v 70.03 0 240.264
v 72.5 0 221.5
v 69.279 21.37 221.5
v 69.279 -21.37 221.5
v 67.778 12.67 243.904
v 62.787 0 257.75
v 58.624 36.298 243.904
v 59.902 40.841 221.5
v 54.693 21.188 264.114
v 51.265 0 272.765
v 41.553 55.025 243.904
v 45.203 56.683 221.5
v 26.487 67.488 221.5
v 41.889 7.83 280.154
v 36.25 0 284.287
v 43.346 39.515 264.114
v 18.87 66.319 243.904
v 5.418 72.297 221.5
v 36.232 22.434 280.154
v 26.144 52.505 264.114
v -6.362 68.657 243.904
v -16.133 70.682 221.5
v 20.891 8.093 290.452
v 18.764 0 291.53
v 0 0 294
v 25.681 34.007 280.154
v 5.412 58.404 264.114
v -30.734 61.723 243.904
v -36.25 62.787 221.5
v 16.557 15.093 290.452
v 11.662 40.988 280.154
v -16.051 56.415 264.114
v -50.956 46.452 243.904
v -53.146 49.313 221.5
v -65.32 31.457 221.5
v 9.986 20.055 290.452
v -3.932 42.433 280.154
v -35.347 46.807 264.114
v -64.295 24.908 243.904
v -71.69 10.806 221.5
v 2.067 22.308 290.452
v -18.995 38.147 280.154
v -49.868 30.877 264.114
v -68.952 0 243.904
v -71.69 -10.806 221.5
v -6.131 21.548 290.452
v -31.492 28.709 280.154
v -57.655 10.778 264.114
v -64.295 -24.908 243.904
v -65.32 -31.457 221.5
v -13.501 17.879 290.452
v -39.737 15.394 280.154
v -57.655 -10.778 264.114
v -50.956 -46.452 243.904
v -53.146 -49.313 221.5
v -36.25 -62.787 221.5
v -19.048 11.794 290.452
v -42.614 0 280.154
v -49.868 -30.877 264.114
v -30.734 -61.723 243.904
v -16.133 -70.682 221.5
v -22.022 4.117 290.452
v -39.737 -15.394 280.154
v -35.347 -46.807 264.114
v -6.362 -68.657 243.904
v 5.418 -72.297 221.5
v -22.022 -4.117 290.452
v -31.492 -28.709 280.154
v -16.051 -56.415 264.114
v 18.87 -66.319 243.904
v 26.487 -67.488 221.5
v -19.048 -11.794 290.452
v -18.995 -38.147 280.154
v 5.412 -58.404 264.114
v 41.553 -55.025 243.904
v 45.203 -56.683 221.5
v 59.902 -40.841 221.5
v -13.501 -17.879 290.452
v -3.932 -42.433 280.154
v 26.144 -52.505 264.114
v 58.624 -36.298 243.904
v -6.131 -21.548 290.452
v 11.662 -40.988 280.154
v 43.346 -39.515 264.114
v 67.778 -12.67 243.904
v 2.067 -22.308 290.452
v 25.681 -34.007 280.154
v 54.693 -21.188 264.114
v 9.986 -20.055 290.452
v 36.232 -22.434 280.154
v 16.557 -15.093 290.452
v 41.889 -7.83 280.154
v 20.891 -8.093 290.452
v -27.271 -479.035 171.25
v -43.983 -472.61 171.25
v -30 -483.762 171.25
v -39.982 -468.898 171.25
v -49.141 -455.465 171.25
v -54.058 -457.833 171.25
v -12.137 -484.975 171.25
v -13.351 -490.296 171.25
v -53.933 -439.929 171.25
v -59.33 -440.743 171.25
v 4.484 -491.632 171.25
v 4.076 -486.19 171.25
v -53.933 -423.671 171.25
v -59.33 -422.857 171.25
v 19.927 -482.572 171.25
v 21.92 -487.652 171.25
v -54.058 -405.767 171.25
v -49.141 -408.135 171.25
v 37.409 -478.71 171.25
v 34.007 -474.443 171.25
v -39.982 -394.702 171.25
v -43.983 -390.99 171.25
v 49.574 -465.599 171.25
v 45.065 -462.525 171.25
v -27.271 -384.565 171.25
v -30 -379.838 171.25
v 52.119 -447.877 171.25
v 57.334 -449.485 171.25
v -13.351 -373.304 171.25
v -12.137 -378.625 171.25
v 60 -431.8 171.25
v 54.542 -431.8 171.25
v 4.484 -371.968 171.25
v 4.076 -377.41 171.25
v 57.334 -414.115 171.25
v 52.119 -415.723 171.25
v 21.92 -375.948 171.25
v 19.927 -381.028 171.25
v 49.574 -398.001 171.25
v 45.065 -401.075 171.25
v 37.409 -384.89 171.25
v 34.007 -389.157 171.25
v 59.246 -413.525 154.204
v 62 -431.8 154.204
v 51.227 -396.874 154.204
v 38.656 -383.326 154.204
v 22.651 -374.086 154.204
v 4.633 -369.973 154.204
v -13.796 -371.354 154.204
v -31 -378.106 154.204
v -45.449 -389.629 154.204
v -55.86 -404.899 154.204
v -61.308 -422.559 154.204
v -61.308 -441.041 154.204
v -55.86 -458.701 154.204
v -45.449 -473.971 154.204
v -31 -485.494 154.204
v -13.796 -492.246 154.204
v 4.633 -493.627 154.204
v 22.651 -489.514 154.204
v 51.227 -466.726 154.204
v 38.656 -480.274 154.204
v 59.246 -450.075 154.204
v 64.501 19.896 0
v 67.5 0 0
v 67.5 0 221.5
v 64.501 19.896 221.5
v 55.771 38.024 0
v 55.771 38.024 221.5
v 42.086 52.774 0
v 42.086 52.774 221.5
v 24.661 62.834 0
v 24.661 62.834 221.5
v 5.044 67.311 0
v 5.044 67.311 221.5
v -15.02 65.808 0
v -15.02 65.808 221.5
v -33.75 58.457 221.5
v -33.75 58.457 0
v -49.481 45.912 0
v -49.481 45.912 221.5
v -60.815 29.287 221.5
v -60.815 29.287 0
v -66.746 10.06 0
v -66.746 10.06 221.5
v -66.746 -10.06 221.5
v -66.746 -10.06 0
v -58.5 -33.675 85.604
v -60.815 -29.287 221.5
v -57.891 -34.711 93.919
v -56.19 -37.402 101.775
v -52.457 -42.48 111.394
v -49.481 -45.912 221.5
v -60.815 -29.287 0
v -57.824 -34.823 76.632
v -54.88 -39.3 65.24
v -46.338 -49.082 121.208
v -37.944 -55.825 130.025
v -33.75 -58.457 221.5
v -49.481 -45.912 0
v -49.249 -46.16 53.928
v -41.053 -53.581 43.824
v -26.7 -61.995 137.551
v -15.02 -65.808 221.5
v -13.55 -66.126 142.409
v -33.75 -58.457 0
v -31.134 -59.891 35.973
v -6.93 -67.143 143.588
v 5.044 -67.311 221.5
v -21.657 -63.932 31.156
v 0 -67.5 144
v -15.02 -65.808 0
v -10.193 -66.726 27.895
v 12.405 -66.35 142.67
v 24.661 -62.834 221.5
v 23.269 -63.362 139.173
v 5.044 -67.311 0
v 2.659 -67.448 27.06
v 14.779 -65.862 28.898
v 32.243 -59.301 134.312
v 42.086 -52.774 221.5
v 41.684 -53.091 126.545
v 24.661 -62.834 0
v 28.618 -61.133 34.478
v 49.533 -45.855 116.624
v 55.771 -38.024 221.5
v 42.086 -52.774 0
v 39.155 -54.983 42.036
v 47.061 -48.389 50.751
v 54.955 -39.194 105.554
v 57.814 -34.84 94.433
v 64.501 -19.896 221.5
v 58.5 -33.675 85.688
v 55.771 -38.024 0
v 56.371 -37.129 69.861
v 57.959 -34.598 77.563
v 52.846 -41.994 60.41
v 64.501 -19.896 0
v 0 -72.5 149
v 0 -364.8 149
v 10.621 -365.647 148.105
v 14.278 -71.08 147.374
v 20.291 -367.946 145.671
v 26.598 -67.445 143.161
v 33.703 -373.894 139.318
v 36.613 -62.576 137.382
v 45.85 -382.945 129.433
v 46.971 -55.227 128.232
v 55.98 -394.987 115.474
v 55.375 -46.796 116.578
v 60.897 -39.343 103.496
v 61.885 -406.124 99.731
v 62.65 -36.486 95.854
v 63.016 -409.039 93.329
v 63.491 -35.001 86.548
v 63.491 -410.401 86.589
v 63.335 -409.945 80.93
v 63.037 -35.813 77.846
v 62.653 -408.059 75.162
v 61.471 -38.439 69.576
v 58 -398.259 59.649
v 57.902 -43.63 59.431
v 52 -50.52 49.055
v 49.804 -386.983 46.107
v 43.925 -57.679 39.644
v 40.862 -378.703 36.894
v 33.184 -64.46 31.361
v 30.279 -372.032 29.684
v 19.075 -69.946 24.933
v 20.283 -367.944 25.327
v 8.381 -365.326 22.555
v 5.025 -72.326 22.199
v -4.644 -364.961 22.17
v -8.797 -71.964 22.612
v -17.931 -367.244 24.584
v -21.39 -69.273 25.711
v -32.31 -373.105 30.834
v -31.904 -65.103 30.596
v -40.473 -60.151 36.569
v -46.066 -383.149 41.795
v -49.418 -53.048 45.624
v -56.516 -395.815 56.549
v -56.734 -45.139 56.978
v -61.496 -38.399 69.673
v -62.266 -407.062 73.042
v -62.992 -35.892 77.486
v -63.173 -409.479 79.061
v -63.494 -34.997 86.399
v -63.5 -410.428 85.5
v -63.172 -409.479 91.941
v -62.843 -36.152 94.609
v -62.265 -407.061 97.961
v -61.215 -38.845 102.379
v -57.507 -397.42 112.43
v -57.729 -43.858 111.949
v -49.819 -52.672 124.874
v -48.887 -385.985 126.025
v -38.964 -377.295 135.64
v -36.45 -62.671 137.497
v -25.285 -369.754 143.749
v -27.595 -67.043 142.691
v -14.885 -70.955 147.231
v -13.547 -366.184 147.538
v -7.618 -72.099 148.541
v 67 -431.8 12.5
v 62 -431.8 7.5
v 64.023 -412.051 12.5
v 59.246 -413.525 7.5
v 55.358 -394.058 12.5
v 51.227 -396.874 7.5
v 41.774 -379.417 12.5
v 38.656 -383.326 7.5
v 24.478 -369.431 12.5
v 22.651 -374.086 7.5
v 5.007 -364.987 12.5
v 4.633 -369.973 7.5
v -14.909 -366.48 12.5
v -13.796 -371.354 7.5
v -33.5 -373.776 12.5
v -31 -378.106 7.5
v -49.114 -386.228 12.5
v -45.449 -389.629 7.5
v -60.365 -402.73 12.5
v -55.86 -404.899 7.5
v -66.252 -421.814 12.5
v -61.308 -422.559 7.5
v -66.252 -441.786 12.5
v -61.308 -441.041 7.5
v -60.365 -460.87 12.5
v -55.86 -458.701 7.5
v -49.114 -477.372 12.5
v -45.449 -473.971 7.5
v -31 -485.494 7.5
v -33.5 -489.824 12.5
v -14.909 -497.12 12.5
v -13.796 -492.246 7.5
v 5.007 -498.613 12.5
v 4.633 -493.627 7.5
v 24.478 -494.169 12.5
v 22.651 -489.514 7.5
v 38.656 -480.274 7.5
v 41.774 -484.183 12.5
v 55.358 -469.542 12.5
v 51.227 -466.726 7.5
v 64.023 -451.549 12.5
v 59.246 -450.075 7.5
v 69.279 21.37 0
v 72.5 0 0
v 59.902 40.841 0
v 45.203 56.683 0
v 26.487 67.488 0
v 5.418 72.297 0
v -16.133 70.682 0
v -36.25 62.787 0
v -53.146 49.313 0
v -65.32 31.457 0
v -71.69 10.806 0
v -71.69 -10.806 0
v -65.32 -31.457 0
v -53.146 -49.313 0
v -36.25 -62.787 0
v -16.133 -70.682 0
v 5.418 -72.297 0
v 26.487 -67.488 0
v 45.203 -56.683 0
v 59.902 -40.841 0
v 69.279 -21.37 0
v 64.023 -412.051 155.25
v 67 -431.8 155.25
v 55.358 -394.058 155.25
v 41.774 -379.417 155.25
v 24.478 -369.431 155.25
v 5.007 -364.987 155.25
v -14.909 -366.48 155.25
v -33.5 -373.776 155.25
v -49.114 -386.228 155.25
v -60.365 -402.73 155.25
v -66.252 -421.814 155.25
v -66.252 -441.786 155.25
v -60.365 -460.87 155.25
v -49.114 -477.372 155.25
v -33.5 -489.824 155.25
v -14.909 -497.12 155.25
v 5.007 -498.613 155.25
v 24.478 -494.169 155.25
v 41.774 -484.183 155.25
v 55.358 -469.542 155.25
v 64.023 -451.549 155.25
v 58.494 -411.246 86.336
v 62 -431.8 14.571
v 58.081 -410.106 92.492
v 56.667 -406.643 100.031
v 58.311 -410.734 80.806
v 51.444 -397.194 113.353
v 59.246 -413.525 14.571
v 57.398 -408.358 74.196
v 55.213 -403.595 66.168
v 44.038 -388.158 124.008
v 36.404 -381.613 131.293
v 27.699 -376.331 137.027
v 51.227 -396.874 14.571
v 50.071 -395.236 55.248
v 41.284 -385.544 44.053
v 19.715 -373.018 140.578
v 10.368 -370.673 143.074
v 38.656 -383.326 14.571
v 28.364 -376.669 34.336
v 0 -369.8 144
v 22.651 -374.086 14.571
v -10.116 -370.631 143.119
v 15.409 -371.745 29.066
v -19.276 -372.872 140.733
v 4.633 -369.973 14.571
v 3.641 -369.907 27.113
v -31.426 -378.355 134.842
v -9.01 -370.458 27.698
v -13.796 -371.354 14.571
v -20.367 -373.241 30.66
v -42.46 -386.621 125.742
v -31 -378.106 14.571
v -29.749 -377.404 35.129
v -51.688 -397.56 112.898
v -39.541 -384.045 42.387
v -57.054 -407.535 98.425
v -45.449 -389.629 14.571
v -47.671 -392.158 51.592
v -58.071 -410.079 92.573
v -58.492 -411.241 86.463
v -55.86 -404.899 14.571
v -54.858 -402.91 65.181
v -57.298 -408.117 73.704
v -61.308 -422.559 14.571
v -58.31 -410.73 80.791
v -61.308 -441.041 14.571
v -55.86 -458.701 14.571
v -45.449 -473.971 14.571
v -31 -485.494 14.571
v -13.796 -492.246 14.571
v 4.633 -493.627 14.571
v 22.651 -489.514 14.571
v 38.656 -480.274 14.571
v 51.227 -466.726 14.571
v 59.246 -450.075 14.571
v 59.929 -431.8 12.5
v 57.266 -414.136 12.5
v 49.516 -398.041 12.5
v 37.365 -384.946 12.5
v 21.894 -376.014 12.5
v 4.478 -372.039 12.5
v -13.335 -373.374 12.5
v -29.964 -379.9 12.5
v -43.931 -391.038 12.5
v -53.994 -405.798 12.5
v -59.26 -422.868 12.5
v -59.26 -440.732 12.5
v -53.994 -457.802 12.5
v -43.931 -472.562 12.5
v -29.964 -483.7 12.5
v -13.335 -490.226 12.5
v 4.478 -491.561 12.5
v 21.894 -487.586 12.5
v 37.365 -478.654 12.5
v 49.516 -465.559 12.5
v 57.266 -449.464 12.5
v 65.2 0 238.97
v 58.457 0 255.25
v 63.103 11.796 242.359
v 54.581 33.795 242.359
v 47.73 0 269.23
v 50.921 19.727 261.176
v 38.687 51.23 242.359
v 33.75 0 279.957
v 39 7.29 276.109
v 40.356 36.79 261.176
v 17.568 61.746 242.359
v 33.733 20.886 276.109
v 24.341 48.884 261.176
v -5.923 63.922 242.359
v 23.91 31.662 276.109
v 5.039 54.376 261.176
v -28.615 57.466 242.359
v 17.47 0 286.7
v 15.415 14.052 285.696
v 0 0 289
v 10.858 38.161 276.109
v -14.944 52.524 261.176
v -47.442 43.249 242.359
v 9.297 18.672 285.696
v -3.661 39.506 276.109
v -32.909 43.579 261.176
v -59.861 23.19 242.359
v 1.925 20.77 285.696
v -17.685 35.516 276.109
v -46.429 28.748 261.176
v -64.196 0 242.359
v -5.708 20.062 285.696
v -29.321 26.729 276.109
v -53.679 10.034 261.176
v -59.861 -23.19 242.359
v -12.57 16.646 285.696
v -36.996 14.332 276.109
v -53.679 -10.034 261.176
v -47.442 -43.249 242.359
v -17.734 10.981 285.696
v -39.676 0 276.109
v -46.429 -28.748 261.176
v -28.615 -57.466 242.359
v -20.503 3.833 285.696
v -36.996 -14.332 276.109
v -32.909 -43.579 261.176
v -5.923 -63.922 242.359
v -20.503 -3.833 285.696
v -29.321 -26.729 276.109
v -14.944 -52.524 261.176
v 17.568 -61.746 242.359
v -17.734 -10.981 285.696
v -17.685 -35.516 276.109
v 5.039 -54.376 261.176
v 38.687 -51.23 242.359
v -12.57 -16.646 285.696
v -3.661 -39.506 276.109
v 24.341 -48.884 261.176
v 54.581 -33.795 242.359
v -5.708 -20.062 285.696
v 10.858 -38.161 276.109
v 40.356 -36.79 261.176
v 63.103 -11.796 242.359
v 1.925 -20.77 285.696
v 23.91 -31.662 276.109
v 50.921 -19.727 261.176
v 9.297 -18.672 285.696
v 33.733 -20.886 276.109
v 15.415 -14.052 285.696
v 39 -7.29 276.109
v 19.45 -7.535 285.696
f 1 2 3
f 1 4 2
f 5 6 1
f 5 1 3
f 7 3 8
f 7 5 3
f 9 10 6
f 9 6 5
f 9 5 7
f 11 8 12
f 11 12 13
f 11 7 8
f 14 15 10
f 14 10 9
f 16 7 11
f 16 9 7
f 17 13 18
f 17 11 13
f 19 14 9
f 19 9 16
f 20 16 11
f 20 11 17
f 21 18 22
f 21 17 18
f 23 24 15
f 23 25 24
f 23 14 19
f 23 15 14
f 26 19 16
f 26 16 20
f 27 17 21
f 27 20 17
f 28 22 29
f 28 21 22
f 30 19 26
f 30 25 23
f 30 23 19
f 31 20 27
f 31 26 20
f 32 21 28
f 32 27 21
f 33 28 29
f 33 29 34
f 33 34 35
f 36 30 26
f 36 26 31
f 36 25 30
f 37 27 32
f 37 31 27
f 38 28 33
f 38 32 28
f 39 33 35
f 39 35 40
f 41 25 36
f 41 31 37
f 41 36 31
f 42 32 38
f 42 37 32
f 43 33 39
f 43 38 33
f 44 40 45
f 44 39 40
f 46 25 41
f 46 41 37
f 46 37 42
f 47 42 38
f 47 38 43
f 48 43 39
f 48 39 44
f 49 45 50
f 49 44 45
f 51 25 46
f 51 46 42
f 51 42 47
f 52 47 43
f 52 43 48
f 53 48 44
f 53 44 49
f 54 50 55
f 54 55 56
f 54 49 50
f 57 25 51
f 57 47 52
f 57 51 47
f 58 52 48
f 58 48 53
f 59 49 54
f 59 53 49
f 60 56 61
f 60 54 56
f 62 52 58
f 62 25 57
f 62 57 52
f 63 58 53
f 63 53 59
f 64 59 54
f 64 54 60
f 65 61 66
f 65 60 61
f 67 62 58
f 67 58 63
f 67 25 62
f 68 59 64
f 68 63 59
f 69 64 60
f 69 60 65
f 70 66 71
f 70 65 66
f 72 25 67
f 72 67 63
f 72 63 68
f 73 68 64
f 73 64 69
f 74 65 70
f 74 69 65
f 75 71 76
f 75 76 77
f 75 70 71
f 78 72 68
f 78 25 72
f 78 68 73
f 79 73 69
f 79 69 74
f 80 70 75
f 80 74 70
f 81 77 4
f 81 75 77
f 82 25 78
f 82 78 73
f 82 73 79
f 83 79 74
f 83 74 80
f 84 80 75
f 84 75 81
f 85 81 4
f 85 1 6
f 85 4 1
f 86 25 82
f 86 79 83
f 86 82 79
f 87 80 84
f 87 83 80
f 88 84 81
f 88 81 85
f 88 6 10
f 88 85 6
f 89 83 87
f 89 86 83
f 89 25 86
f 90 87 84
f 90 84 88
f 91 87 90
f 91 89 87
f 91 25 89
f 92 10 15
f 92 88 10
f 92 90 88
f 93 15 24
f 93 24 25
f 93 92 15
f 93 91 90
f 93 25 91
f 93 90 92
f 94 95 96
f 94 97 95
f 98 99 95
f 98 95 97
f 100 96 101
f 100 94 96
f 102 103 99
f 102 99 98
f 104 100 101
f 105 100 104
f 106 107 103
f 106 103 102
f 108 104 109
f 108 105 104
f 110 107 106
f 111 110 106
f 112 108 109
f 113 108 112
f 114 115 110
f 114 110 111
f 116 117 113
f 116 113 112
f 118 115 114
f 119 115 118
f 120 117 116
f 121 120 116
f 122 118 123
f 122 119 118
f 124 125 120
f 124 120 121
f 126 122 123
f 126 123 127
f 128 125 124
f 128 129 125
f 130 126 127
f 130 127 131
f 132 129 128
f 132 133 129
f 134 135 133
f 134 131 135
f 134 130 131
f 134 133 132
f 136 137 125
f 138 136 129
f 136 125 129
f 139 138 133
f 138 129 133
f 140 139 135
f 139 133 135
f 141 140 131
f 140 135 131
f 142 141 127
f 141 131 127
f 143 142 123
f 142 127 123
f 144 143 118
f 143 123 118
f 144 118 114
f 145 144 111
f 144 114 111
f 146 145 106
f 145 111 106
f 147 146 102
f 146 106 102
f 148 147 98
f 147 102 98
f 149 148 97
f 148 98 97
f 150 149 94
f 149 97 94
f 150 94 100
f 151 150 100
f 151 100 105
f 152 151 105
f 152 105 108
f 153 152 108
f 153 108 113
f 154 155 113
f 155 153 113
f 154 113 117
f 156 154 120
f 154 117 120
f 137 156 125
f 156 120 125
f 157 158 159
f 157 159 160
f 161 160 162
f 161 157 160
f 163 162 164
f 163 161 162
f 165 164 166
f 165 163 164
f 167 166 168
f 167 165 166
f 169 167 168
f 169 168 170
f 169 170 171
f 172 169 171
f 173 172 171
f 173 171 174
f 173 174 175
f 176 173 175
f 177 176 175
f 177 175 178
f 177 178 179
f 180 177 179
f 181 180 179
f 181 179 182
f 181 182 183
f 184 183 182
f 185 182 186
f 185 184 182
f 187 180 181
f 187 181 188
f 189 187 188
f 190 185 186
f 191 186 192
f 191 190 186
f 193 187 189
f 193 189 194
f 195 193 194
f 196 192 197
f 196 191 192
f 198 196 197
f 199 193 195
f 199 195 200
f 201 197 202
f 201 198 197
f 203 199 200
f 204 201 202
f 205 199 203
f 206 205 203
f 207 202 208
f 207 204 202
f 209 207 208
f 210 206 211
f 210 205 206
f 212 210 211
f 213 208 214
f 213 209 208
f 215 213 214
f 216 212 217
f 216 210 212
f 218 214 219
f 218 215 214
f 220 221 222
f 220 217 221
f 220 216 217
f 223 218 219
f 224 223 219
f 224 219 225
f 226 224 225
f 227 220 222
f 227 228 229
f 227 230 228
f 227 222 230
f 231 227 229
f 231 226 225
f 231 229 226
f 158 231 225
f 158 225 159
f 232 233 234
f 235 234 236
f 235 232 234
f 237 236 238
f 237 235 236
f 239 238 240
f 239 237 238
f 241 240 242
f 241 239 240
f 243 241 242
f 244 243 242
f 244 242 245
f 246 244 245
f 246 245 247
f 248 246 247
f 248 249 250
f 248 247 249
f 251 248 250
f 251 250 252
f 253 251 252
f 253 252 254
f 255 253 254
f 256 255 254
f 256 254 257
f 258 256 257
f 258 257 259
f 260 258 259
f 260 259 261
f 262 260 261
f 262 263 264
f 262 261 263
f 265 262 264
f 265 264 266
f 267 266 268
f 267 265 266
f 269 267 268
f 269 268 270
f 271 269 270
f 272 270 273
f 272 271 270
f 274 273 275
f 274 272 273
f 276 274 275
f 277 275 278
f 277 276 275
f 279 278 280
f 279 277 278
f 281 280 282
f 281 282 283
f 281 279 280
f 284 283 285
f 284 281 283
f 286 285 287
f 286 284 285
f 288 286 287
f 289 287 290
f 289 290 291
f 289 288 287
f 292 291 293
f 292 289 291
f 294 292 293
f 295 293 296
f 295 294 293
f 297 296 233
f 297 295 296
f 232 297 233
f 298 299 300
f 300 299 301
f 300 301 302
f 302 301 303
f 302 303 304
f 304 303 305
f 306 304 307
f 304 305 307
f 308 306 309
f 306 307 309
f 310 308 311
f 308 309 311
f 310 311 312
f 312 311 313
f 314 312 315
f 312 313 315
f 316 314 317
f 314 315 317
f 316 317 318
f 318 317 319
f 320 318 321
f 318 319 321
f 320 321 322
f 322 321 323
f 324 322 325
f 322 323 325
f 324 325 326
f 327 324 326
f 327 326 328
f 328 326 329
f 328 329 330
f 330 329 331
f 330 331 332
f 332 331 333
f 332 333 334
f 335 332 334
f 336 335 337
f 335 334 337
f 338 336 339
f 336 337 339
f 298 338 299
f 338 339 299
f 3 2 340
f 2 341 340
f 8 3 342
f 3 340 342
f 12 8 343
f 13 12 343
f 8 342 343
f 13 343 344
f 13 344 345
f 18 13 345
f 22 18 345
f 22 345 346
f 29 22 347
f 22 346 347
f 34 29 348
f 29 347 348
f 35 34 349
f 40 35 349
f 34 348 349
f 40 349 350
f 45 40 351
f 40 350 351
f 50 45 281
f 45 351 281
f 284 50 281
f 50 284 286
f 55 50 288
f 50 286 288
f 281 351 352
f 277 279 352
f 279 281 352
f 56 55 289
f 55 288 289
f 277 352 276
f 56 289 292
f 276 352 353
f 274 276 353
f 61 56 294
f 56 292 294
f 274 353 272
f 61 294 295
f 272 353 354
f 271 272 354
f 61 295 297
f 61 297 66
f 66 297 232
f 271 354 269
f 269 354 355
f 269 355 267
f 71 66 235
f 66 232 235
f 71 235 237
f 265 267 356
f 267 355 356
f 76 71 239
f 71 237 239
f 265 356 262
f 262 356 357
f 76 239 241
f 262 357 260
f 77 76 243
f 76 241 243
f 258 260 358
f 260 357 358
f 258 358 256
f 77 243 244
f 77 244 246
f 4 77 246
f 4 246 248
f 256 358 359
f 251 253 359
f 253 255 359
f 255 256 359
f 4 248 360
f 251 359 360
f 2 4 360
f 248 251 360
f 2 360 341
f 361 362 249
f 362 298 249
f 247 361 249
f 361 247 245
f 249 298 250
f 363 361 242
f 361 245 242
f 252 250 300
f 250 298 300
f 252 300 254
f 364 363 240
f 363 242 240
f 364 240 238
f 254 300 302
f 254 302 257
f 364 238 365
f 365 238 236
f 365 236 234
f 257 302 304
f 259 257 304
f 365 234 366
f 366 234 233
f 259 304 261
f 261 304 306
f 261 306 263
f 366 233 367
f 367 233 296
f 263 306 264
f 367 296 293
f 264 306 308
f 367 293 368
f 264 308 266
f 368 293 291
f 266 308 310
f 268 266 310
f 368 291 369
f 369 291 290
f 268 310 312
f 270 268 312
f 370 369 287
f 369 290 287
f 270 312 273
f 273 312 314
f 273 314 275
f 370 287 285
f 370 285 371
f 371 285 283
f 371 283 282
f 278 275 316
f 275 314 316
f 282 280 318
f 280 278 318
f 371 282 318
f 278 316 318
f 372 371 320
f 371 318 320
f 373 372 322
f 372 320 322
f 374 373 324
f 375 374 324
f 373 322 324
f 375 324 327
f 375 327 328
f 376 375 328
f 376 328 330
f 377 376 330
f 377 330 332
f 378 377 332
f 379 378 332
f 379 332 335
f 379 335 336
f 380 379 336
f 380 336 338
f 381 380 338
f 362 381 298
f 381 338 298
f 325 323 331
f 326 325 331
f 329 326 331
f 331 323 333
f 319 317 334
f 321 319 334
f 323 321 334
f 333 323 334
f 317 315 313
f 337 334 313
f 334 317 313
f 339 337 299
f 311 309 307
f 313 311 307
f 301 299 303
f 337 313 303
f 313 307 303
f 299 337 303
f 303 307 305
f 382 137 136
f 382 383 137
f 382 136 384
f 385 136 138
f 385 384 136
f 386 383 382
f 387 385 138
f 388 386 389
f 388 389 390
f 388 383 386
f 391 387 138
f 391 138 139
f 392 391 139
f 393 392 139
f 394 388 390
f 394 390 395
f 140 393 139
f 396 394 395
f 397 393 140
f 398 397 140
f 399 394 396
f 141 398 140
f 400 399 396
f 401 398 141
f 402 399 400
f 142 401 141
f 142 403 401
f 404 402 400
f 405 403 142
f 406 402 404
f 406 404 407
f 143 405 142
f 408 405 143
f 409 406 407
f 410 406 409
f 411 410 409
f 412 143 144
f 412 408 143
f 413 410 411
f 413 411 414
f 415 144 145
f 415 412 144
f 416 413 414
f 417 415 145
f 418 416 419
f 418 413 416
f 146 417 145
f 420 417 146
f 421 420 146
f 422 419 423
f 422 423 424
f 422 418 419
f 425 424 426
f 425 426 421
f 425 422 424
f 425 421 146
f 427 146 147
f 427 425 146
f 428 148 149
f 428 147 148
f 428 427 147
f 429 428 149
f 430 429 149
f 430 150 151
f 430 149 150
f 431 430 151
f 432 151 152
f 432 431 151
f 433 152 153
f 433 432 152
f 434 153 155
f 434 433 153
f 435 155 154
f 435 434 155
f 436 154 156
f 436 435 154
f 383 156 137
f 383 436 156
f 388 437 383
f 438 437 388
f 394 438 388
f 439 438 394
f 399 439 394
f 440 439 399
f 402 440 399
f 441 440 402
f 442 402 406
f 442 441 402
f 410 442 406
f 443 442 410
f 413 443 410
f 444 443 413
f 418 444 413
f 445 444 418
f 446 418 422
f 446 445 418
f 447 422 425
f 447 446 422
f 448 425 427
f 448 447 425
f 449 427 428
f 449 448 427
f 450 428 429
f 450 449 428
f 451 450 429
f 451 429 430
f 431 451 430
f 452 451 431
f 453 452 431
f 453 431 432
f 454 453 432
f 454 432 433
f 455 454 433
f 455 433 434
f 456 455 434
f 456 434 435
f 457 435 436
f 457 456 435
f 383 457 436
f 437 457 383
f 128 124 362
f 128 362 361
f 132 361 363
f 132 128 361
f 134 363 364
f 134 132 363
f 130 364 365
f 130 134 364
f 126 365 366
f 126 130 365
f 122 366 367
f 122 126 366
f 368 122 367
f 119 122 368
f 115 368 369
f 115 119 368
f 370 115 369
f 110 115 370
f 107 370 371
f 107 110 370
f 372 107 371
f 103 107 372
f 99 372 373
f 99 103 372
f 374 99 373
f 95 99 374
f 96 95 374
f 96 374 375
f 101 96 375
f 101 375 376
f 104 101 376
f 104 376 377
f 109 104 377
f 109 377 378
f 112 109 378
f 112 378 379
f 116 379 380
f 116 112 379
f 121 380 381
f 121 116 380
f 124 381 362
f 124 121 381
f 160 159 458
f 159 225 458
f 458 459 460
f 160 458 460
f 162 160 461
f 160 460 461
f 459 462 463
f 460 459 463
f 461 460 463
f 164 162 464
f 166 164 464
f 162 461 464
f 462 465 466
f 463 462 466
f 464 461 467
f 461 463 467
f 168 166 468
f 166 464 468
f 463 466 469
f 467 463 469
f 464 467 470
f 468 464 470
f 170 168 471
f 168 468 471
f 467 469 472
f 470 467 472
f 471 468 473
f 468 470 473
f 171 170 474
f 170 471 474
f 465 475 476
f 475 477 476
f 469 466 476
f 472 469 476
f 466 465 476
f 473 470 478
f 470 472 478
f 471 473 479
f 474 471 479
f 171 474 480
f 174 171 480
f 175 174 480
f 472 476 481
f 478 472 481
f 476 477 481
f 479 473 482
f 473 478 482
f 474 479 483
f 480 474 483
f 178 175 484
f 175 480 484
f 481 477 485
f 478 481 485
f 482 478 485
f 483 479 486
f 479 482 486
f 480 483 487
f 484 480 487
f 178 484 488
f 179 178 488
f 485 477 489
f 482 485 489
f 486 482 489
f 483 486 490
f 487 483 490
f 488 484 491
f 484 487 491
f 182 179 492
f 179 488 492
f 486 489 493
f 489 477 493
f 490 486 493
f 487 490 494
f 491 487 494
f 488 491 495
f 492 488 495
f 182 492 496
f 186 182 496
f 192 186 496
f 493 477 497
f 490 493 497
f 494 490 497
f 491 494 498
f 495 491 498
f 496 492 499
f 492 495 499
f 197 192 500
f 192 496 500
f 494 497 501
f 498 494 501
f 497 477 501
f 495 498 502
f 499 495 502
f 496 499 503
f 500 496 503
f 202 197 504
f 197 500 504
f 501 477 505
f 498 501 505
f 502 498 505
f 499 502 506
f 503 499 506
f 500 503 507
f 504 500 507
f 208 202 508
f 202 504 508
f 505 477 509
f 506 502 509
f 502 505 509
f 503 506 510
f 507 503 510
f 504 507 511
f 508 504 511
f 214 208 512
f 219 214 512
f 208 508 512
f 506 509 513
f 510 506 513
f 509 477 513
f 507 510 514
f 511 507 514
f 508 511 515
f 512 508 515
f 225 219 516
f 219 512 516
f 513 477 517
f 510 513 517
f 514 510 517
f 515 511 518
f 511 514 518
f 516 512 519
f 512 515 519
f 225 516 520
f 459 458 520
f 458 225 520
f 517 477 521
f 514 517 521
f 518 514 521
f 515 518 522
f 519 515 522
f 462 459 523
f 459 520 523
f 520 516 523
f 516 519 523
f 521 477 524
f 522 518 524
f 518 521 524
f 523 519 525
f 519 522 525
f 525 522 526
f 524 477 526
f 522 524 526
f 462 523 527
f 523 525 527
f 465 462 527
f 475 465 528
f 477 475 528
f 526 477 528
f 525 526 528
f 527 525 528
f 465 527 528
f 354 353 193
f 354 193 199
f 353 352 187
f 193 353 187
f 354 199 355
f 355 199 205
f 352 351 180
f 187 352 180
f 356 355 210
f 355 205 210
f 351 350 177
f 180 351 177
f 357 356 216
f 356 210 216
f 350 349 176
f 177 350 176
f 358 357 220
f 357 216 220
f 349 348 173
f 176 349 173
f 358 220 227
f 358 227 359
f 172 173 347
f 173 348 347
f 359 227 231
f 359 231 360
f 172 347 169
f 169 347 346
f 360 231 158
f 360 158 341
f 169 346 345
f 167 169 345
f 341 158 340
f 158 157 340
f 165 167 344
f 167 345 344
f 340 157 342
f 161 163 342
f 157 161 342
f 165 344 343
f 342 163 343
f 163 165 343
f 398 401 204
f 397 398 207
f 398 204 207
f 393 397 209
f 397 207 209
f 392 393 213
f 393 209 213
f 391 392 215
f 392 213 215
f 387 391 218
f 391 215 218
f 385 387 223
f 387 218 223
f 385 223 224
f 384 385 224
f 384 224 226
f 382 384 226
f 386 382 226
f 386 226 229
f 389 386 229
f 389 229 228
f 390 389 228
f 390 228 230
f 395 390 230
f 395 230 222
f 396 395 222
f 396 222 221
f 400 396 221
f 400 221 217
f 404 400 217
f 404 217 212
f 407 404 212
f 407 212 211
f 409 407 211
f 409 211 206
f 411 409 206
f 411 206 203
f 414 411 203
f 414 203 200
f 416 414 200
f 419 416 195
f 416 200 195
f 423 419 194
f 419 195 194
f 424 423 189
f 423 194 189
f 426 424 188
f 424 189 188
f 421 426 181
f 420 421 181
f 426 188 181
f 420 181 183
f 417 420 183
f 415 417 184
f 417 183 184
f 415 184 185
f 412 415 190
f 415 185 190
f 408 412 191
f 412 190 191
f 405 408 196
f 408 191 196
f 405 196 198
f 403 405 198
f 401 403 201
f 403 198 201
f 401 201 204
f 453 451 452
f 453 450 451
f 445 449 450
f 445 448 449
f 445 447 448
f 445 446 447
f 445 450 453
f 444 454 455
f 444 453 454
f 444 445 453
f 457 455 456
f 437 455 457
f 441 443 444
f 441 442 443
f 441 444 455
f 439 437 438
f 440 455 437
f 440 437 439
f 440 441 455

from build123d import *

# Parameters (mm, degrees)
SKETCH1_R                = 72.5
BOSS_EXTRUDE1_DEPTH      = 294
FILLET1_R                = 72.5
SKETCH2_R                = 63.5
BOSS_EXTRUDE2_DEPTH      = 431.8
BOSS_EXTRUDE3_DEPTH      = 85.75
BOSS_EXTRUDE3_DEPTH_BACK = 78
SKETCH3_R                = 67
CHAMFER1_SIZE            = 5
CHAMFER2_SIZE            = 16
CHAMFER2_SIZE2           = 7
SHELL1_T                 = -5


with BuildPart() as part:
    # Sketch1 → Boss-Extrude1 (new body)
    with BuildSketch(Plane.XY):
        Circle(SKETCH1_R)
    extrude(amount=BOSS_EXTRUDE1_DEPTH)

    # Fillet1
    fillet1_edges = [part.edges().sort_by_distance(p)[0] for p in [
        (-72.5, 0, 294),
    ]]
    fillet(fillet1_edges, radius=FILLET1_R)

    # Sketch2 → Boss-Extrude2 (add)
    with BuildSketch(Plane(origin=(0, 0, 0), x_dir=(1, 0, 0), z_dir=(0, 1, 0))):
        with Locations((0, -85.5)):
            Circle(SKETCH2_R)
    extrude(amount=-BOSS_EXTRUDE2_DEPTH)

    # Sketch3 → Boss-Extrude3 (add, two sides: drawn at the far end of the back side and taken through both)
    with BuildSketch(Plane.XY.offset(85.5).offset(-BOSS_EXTRUDE3_DEPTH_BACK)):
        with Locations((0, -431.8)):
            Circle(SKETCH3_R)
    extrude(amount=BOSS_EXTRUDE3_DEPTH + BOSS_EXTRUDE3_DEPTH_BACK)

    # Chamfer1
    chamfer1_edges = [part.edges().sort_by_distance(p)[0] for p in [
        (-67, -431.8, 7.5),
    ]]
    chamfer(chamfer1_edges, length=CHAMFER1_SIZE)

    # Chamfer2
    chamfer2_edges = [part.edges().sort_by_distance(p)[0] for p in [
        (-67, -431.8, 171.25),
    ]]
    chamfer2_side = [part.faces().sort_by_distance(p)[0] for p in [
        (-67, -431.8, 91.875),
    ]]
    chamfer(chamfer2_edges, length=CHAMFER2_SIZE, length2=CHAMFER2_SIZE2, reference=chamfer2_side[0])

    # Shell1
    shell1_openings = [part.faces().sort_by_distance(p)[0] for p in [
        (0, -431.8, 171.25),
        (0, 0, 0),
    ]]
    offset(amount=SHELL1_T, openings=shell1_openings, kind=Kind.INTERSECTION)


solid = part.part
